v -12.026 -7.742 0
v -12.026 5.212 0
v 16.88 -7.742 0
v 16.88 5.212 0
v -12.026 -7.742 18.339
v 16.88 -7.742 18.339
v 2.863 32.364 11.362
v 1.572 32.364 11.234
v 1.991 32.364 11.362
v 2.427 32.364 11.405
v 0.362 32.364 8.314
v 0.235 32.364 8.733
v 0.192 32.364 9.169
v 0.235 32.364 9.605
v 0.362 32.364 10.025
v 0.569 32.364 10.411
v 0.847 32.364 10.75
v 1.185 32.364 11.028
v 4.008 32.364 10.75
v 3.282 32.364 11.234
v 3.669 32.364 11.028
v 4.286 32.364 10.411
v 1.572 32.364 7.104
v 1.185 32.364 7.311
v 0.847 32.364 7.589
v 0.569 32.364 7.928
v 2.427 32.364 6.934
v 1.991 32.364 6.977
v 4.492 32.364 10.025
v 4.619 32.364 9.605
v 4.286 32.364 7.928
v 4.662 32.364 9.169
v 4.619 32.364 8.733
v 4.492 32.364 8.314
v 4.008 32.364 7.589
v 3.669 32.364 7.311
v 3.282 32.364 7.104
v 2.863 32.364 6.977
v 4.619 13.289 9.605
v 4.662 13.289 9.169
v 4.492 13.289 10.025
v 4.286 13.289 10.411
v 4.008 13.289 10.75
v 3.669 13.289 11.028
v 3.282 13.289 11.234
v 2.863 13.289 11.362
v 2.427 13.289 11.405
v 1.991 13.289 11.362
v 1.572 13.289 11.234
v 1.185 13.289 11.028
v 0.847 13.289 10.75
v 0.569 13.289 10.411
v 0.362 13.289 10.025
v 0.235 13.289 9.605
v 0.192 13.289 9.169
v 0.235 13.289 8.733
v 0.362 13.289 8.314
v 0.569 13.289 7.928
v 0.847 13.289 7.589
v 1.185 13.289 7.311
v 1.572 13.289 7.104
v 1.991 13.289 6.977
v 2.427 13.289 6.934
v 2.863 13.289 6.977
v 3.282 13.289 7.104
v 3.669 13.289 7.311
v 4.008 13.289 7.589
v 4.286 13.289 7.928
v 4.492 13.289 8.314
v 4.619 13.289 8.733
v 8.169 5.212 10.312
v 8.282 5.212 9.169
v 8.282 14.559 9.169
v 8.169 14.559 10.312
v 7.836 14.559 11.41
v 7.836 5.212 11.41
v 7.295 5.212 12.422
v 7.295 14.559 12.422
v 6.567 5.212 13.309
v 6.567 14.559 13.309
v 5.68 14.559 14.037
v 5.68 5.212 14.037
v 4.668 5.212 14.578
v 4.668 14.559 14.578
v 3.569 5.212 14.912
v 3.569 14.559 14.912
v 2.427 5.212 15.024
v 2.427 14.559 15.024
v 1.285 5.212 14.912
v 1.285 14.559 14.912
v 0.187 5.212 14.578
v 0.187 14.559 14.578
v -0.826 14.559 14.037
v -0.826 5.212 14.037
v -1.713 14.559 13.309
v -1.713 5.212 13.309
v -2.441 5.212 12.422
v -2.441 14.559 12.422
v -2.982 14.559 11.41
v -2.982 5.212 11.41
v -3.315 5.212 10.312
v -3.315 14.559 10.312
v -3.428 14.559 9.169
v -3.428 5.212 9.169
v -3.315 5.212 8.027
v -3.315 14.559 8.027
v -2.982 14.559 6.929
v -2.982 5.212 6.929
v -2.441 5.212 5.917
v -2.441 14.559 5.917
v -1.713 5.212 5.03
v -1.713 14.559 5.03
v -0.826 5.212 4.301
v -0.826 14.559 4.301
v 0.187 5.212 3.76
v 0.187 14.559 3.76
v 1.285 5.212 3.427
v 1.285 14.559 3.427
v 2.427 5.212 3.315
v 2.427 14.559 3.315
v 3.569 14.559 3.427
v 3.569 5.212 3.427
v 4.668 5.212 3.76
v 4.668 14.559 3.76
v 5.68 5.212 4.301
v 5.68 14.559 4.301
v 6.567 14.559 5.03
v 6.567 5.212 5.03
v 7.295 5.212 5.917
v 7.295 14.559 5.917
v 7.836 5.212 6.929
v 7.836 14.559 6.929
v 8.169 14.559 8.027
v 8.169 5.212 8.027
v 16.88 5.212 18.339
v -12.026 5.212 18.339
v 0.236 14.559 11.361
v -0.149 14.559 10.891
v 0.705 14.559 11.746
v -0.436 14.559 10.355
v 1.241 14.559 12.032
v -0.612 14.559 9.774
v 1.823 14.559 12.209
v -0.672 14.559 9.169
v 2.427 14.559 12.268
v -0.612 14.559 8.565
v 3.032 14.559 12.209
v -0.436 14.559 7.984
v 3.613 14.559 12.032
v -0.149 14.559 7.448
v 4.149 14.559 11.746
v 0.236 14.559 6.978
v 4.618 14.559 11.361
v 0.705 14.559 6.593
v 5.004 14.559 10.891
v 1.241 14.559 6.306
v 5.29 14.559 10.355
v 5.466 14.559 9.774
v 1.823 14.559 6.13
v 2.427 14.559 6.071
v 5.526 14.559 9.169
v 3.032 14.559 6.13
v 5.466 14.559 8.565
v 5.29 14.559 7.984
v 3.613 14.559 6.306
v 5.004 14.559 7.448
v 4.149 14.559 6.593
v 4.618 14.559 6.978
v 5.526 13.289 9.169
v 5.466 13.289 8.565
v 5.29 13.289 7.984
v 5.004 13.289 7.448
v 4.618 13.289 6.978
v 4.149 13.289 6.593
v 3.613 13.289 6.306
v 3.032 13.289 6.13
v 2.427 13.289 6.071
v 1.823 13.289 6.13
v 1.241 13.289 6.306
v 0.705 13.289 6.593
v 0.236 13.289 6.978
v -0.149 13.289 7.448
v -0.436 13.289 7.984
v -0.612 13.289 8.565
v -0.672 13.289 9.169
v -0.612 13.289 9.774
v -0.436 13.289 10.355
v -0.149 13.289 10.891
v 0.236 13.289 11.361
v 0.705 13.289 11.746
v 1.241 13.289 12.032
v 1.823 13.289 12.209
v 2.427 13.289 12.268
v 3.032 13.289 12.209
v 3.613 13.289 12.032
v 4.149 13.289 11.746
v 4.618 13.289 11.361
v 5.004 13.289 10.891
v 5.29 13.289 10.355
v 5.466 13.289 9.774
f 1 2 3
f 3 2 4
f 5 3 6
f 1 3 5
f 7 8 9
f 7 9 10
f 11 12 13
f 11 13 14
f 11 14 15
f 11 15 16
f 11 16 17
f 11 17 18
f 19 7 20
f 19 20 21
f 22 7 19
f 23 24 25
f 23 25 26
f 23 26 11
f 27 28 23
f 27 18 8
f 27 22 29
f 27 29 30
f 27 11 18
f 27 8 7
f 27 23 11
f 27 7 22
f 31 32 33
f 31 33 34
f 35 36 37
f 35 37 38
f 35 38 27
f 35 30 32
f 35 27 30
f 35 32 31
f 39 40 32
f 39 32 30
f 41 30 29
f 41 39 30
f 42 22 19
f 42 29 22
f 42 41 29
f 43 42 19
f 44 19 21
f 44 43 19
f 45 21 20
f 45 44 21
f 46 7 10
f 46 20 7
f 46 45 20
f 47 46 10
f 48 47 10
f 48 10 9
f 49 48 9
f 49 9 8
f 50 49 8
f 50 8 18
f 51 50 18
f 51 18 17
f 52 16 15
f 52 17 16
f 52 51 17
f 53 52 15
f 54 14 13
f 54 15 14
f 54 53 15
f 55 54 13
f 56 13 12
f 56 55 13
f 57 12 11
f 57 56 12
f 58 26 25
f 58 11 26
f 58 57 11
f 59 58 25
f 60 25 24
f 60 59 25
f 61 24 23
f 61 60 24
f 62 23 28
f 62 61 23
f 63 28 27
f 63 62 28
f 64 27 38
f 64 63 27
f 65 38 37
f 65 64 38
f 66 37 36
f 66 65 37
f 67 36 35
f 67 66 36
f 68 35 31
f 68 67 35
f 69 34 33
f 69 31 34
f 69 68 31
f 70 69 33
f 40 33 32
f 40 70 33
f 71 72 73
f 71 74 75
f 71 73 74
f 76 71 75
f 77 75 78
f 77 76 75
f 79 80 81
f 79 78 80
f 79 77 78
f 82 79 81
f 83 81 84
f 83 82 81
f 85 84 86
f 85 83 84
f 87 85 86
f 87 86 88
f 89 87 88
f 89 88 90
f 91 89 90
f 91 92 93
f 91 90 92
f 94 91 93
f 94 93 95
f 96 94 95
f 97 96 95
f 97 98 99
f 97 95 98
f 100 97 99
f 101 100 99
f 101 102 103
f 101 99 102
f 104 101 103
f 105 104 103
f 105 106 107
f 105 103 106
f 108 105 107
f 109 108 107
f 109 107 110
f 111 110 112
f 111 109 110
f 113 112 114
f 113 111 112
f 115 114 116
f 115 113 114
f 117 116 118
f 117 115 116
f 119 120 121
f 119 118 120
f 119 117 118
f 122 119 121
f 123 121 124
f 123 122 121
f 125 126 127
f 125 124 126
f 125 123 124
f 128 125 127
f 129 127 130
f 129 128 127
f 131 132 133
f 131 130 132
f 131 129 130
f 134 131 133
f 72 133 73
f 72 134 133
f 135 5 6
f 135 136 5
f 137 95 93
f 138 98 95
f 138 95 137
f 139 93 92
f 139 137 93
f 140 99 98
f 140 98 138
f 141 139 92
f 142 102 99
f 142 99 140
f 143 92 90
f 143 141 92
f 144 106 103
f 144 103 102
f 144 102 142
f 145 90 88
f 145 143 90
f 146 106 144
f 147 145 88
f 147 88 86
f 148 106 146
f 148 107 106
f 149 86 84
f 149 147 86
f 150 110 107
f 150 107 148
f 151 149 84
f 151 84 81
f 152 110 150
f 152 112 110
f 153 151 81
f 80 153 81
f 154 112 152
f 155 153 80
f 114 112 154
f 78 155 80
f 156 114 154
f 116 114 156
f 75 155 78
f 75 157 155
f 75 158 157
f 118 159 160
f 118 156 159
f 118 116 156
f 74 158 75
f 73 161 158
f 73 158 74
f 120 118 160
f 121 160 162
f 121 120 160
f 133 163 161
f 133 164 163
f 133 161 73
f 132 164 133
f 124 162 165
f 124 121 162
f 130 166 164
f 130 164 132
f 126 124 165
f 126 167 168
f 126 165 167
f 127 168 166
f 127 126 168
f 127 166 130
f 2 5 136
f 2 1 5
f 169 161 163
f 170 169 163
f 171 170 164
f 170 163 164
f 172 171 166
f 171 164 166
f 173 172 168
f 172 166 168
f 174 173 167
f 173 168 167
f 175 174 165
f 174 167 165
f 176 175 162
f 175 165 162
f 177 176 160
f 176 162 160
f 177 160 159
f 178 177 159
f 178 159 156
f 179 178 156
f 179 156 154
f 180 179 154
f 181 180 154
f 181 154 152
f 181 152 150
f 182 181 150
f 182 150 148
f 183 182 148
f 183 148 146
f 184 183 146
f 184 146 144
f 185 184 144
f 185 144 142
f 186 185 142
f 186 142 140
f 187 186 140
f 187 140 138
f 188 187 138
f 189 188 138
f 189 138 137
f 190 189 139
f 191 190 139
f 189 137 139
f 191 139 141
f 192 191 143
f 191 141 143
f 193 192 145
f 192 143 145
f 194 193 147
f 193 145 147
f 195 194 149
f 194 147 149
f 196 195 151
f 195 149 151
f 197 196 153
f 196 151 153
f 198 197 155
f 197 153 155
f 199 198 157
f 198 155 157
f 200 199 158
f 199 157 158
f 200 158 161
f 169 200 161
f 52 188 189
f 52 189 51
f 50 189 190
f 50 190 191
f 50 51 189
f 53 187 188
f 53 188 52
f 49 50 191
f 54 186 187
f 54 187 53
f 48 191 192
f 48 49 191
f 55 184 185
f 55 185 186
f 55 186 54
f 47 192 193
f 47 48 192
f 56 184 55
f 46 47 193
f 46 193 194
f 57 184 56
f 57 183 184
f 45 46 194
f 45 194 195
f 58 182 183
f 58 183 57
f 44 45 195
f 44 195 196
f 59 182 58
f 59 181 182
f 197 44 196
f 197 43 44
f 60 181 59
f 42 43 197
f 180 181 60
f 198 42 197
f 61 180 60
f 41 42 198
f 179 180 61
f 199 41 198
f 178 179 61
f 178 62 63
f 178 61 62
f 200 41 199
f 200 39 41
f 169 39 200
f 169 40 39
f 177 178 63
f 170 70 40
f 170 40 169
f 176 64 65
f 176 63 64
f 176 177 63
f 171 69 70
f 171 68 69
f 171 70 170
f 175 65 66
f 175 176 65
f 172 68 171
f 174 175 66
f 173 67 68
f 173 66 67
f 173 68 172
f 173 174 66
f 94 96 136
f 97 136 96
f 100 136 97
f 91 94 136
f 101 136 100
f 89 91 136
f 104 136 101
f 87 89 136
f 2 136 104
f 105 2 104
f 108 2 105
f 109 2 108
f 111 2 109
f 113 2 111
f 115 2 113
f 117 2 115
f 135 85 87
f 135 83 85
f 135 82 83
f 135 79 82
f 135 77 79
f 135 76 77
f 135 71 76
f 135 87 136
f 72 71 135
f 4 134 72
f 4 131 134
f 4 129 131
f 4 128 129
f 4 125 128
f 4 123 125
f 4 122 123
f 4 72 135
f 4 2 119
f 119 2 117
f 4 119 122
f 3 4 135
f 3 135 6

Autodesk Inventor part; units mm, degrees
ref_plane "YZ Plane" through (0, 0, 0) normal (1, 0, 0) x (0, 1, 0)
ref_plane "XZ Plane" through (0, 0, 0) normal (0, 1, 0) x (-1, 0, 0)
ref_plane "XY Plane" through (0, 0, 0) normal (0, 0, 1) x (1, 0, 0)
sketch "Sketch1" plane through (0, 0, 0) normal (0, 0, 1) x (1, 0, 0)
  line L0 (-12.0255, 5.2117) -> (16.8797, 5.2117)
  line L1 (16.8797, 5.2117) -> (16.8797, -7.7423)
  line L2 (16.8797, -7.7423) -> (-12.0255, -7.7423)
  line L3 (-12.0255, -7.7423) -> (-12.0255, 5.2117)
  point P0 (0, 0)
  dimension "d0" = 12.954
  dimension "d1" = 28.9052
extrude "Extrusion1" add sketch "Sketch1" along normal blind 18.3388
sketch "Sketch2" plane through (-12.0255, 5.2117, 0) normal (0, 1, 0) x (1, 0, 0)
  line L0 (0, 0) -> (28.9052, 0) projected
  line L1 (28.9052, -18.3388) -> (0, -18.3388) projected
  line L2 (0, 0) -> (0, -18.3388) projected
  circle A0 centre (14.4526, -9.1694) radius 5.8547
  point P0 (12.0255, 0)
  dimension "d4" = 11.7094
extrude "Extrusion2" add sketch "Sketch2" along normal blind 9.3472
sketch "Sketch3" plane through (2.4271, 14.5589, 9.1694) normal (0, 1, 0) x (1, 0, 0)
  circle A0 centre (0, 0) radius 3.0988
  point P0 (-2.4271, 9.1694)
  dimension "d7" = 6.1976
extrude "Extrusion3" cut sketch "Sketch3" against normal blind 1.27
sketch "Sketch4" plane through (2.4271, 13.2889, 9.1694) normal (0, 1, 0) x (1, 0, 0)
  circle A0 centre (0, 0) radius 2.2352
  point P0 (-2.4271, 9.1694)
  dimension "d10" = 4.4704
extrude "Extrusion4" add sketch "Sketch4" along normal blind 19.0754
properties part number "mcdave_switch"
